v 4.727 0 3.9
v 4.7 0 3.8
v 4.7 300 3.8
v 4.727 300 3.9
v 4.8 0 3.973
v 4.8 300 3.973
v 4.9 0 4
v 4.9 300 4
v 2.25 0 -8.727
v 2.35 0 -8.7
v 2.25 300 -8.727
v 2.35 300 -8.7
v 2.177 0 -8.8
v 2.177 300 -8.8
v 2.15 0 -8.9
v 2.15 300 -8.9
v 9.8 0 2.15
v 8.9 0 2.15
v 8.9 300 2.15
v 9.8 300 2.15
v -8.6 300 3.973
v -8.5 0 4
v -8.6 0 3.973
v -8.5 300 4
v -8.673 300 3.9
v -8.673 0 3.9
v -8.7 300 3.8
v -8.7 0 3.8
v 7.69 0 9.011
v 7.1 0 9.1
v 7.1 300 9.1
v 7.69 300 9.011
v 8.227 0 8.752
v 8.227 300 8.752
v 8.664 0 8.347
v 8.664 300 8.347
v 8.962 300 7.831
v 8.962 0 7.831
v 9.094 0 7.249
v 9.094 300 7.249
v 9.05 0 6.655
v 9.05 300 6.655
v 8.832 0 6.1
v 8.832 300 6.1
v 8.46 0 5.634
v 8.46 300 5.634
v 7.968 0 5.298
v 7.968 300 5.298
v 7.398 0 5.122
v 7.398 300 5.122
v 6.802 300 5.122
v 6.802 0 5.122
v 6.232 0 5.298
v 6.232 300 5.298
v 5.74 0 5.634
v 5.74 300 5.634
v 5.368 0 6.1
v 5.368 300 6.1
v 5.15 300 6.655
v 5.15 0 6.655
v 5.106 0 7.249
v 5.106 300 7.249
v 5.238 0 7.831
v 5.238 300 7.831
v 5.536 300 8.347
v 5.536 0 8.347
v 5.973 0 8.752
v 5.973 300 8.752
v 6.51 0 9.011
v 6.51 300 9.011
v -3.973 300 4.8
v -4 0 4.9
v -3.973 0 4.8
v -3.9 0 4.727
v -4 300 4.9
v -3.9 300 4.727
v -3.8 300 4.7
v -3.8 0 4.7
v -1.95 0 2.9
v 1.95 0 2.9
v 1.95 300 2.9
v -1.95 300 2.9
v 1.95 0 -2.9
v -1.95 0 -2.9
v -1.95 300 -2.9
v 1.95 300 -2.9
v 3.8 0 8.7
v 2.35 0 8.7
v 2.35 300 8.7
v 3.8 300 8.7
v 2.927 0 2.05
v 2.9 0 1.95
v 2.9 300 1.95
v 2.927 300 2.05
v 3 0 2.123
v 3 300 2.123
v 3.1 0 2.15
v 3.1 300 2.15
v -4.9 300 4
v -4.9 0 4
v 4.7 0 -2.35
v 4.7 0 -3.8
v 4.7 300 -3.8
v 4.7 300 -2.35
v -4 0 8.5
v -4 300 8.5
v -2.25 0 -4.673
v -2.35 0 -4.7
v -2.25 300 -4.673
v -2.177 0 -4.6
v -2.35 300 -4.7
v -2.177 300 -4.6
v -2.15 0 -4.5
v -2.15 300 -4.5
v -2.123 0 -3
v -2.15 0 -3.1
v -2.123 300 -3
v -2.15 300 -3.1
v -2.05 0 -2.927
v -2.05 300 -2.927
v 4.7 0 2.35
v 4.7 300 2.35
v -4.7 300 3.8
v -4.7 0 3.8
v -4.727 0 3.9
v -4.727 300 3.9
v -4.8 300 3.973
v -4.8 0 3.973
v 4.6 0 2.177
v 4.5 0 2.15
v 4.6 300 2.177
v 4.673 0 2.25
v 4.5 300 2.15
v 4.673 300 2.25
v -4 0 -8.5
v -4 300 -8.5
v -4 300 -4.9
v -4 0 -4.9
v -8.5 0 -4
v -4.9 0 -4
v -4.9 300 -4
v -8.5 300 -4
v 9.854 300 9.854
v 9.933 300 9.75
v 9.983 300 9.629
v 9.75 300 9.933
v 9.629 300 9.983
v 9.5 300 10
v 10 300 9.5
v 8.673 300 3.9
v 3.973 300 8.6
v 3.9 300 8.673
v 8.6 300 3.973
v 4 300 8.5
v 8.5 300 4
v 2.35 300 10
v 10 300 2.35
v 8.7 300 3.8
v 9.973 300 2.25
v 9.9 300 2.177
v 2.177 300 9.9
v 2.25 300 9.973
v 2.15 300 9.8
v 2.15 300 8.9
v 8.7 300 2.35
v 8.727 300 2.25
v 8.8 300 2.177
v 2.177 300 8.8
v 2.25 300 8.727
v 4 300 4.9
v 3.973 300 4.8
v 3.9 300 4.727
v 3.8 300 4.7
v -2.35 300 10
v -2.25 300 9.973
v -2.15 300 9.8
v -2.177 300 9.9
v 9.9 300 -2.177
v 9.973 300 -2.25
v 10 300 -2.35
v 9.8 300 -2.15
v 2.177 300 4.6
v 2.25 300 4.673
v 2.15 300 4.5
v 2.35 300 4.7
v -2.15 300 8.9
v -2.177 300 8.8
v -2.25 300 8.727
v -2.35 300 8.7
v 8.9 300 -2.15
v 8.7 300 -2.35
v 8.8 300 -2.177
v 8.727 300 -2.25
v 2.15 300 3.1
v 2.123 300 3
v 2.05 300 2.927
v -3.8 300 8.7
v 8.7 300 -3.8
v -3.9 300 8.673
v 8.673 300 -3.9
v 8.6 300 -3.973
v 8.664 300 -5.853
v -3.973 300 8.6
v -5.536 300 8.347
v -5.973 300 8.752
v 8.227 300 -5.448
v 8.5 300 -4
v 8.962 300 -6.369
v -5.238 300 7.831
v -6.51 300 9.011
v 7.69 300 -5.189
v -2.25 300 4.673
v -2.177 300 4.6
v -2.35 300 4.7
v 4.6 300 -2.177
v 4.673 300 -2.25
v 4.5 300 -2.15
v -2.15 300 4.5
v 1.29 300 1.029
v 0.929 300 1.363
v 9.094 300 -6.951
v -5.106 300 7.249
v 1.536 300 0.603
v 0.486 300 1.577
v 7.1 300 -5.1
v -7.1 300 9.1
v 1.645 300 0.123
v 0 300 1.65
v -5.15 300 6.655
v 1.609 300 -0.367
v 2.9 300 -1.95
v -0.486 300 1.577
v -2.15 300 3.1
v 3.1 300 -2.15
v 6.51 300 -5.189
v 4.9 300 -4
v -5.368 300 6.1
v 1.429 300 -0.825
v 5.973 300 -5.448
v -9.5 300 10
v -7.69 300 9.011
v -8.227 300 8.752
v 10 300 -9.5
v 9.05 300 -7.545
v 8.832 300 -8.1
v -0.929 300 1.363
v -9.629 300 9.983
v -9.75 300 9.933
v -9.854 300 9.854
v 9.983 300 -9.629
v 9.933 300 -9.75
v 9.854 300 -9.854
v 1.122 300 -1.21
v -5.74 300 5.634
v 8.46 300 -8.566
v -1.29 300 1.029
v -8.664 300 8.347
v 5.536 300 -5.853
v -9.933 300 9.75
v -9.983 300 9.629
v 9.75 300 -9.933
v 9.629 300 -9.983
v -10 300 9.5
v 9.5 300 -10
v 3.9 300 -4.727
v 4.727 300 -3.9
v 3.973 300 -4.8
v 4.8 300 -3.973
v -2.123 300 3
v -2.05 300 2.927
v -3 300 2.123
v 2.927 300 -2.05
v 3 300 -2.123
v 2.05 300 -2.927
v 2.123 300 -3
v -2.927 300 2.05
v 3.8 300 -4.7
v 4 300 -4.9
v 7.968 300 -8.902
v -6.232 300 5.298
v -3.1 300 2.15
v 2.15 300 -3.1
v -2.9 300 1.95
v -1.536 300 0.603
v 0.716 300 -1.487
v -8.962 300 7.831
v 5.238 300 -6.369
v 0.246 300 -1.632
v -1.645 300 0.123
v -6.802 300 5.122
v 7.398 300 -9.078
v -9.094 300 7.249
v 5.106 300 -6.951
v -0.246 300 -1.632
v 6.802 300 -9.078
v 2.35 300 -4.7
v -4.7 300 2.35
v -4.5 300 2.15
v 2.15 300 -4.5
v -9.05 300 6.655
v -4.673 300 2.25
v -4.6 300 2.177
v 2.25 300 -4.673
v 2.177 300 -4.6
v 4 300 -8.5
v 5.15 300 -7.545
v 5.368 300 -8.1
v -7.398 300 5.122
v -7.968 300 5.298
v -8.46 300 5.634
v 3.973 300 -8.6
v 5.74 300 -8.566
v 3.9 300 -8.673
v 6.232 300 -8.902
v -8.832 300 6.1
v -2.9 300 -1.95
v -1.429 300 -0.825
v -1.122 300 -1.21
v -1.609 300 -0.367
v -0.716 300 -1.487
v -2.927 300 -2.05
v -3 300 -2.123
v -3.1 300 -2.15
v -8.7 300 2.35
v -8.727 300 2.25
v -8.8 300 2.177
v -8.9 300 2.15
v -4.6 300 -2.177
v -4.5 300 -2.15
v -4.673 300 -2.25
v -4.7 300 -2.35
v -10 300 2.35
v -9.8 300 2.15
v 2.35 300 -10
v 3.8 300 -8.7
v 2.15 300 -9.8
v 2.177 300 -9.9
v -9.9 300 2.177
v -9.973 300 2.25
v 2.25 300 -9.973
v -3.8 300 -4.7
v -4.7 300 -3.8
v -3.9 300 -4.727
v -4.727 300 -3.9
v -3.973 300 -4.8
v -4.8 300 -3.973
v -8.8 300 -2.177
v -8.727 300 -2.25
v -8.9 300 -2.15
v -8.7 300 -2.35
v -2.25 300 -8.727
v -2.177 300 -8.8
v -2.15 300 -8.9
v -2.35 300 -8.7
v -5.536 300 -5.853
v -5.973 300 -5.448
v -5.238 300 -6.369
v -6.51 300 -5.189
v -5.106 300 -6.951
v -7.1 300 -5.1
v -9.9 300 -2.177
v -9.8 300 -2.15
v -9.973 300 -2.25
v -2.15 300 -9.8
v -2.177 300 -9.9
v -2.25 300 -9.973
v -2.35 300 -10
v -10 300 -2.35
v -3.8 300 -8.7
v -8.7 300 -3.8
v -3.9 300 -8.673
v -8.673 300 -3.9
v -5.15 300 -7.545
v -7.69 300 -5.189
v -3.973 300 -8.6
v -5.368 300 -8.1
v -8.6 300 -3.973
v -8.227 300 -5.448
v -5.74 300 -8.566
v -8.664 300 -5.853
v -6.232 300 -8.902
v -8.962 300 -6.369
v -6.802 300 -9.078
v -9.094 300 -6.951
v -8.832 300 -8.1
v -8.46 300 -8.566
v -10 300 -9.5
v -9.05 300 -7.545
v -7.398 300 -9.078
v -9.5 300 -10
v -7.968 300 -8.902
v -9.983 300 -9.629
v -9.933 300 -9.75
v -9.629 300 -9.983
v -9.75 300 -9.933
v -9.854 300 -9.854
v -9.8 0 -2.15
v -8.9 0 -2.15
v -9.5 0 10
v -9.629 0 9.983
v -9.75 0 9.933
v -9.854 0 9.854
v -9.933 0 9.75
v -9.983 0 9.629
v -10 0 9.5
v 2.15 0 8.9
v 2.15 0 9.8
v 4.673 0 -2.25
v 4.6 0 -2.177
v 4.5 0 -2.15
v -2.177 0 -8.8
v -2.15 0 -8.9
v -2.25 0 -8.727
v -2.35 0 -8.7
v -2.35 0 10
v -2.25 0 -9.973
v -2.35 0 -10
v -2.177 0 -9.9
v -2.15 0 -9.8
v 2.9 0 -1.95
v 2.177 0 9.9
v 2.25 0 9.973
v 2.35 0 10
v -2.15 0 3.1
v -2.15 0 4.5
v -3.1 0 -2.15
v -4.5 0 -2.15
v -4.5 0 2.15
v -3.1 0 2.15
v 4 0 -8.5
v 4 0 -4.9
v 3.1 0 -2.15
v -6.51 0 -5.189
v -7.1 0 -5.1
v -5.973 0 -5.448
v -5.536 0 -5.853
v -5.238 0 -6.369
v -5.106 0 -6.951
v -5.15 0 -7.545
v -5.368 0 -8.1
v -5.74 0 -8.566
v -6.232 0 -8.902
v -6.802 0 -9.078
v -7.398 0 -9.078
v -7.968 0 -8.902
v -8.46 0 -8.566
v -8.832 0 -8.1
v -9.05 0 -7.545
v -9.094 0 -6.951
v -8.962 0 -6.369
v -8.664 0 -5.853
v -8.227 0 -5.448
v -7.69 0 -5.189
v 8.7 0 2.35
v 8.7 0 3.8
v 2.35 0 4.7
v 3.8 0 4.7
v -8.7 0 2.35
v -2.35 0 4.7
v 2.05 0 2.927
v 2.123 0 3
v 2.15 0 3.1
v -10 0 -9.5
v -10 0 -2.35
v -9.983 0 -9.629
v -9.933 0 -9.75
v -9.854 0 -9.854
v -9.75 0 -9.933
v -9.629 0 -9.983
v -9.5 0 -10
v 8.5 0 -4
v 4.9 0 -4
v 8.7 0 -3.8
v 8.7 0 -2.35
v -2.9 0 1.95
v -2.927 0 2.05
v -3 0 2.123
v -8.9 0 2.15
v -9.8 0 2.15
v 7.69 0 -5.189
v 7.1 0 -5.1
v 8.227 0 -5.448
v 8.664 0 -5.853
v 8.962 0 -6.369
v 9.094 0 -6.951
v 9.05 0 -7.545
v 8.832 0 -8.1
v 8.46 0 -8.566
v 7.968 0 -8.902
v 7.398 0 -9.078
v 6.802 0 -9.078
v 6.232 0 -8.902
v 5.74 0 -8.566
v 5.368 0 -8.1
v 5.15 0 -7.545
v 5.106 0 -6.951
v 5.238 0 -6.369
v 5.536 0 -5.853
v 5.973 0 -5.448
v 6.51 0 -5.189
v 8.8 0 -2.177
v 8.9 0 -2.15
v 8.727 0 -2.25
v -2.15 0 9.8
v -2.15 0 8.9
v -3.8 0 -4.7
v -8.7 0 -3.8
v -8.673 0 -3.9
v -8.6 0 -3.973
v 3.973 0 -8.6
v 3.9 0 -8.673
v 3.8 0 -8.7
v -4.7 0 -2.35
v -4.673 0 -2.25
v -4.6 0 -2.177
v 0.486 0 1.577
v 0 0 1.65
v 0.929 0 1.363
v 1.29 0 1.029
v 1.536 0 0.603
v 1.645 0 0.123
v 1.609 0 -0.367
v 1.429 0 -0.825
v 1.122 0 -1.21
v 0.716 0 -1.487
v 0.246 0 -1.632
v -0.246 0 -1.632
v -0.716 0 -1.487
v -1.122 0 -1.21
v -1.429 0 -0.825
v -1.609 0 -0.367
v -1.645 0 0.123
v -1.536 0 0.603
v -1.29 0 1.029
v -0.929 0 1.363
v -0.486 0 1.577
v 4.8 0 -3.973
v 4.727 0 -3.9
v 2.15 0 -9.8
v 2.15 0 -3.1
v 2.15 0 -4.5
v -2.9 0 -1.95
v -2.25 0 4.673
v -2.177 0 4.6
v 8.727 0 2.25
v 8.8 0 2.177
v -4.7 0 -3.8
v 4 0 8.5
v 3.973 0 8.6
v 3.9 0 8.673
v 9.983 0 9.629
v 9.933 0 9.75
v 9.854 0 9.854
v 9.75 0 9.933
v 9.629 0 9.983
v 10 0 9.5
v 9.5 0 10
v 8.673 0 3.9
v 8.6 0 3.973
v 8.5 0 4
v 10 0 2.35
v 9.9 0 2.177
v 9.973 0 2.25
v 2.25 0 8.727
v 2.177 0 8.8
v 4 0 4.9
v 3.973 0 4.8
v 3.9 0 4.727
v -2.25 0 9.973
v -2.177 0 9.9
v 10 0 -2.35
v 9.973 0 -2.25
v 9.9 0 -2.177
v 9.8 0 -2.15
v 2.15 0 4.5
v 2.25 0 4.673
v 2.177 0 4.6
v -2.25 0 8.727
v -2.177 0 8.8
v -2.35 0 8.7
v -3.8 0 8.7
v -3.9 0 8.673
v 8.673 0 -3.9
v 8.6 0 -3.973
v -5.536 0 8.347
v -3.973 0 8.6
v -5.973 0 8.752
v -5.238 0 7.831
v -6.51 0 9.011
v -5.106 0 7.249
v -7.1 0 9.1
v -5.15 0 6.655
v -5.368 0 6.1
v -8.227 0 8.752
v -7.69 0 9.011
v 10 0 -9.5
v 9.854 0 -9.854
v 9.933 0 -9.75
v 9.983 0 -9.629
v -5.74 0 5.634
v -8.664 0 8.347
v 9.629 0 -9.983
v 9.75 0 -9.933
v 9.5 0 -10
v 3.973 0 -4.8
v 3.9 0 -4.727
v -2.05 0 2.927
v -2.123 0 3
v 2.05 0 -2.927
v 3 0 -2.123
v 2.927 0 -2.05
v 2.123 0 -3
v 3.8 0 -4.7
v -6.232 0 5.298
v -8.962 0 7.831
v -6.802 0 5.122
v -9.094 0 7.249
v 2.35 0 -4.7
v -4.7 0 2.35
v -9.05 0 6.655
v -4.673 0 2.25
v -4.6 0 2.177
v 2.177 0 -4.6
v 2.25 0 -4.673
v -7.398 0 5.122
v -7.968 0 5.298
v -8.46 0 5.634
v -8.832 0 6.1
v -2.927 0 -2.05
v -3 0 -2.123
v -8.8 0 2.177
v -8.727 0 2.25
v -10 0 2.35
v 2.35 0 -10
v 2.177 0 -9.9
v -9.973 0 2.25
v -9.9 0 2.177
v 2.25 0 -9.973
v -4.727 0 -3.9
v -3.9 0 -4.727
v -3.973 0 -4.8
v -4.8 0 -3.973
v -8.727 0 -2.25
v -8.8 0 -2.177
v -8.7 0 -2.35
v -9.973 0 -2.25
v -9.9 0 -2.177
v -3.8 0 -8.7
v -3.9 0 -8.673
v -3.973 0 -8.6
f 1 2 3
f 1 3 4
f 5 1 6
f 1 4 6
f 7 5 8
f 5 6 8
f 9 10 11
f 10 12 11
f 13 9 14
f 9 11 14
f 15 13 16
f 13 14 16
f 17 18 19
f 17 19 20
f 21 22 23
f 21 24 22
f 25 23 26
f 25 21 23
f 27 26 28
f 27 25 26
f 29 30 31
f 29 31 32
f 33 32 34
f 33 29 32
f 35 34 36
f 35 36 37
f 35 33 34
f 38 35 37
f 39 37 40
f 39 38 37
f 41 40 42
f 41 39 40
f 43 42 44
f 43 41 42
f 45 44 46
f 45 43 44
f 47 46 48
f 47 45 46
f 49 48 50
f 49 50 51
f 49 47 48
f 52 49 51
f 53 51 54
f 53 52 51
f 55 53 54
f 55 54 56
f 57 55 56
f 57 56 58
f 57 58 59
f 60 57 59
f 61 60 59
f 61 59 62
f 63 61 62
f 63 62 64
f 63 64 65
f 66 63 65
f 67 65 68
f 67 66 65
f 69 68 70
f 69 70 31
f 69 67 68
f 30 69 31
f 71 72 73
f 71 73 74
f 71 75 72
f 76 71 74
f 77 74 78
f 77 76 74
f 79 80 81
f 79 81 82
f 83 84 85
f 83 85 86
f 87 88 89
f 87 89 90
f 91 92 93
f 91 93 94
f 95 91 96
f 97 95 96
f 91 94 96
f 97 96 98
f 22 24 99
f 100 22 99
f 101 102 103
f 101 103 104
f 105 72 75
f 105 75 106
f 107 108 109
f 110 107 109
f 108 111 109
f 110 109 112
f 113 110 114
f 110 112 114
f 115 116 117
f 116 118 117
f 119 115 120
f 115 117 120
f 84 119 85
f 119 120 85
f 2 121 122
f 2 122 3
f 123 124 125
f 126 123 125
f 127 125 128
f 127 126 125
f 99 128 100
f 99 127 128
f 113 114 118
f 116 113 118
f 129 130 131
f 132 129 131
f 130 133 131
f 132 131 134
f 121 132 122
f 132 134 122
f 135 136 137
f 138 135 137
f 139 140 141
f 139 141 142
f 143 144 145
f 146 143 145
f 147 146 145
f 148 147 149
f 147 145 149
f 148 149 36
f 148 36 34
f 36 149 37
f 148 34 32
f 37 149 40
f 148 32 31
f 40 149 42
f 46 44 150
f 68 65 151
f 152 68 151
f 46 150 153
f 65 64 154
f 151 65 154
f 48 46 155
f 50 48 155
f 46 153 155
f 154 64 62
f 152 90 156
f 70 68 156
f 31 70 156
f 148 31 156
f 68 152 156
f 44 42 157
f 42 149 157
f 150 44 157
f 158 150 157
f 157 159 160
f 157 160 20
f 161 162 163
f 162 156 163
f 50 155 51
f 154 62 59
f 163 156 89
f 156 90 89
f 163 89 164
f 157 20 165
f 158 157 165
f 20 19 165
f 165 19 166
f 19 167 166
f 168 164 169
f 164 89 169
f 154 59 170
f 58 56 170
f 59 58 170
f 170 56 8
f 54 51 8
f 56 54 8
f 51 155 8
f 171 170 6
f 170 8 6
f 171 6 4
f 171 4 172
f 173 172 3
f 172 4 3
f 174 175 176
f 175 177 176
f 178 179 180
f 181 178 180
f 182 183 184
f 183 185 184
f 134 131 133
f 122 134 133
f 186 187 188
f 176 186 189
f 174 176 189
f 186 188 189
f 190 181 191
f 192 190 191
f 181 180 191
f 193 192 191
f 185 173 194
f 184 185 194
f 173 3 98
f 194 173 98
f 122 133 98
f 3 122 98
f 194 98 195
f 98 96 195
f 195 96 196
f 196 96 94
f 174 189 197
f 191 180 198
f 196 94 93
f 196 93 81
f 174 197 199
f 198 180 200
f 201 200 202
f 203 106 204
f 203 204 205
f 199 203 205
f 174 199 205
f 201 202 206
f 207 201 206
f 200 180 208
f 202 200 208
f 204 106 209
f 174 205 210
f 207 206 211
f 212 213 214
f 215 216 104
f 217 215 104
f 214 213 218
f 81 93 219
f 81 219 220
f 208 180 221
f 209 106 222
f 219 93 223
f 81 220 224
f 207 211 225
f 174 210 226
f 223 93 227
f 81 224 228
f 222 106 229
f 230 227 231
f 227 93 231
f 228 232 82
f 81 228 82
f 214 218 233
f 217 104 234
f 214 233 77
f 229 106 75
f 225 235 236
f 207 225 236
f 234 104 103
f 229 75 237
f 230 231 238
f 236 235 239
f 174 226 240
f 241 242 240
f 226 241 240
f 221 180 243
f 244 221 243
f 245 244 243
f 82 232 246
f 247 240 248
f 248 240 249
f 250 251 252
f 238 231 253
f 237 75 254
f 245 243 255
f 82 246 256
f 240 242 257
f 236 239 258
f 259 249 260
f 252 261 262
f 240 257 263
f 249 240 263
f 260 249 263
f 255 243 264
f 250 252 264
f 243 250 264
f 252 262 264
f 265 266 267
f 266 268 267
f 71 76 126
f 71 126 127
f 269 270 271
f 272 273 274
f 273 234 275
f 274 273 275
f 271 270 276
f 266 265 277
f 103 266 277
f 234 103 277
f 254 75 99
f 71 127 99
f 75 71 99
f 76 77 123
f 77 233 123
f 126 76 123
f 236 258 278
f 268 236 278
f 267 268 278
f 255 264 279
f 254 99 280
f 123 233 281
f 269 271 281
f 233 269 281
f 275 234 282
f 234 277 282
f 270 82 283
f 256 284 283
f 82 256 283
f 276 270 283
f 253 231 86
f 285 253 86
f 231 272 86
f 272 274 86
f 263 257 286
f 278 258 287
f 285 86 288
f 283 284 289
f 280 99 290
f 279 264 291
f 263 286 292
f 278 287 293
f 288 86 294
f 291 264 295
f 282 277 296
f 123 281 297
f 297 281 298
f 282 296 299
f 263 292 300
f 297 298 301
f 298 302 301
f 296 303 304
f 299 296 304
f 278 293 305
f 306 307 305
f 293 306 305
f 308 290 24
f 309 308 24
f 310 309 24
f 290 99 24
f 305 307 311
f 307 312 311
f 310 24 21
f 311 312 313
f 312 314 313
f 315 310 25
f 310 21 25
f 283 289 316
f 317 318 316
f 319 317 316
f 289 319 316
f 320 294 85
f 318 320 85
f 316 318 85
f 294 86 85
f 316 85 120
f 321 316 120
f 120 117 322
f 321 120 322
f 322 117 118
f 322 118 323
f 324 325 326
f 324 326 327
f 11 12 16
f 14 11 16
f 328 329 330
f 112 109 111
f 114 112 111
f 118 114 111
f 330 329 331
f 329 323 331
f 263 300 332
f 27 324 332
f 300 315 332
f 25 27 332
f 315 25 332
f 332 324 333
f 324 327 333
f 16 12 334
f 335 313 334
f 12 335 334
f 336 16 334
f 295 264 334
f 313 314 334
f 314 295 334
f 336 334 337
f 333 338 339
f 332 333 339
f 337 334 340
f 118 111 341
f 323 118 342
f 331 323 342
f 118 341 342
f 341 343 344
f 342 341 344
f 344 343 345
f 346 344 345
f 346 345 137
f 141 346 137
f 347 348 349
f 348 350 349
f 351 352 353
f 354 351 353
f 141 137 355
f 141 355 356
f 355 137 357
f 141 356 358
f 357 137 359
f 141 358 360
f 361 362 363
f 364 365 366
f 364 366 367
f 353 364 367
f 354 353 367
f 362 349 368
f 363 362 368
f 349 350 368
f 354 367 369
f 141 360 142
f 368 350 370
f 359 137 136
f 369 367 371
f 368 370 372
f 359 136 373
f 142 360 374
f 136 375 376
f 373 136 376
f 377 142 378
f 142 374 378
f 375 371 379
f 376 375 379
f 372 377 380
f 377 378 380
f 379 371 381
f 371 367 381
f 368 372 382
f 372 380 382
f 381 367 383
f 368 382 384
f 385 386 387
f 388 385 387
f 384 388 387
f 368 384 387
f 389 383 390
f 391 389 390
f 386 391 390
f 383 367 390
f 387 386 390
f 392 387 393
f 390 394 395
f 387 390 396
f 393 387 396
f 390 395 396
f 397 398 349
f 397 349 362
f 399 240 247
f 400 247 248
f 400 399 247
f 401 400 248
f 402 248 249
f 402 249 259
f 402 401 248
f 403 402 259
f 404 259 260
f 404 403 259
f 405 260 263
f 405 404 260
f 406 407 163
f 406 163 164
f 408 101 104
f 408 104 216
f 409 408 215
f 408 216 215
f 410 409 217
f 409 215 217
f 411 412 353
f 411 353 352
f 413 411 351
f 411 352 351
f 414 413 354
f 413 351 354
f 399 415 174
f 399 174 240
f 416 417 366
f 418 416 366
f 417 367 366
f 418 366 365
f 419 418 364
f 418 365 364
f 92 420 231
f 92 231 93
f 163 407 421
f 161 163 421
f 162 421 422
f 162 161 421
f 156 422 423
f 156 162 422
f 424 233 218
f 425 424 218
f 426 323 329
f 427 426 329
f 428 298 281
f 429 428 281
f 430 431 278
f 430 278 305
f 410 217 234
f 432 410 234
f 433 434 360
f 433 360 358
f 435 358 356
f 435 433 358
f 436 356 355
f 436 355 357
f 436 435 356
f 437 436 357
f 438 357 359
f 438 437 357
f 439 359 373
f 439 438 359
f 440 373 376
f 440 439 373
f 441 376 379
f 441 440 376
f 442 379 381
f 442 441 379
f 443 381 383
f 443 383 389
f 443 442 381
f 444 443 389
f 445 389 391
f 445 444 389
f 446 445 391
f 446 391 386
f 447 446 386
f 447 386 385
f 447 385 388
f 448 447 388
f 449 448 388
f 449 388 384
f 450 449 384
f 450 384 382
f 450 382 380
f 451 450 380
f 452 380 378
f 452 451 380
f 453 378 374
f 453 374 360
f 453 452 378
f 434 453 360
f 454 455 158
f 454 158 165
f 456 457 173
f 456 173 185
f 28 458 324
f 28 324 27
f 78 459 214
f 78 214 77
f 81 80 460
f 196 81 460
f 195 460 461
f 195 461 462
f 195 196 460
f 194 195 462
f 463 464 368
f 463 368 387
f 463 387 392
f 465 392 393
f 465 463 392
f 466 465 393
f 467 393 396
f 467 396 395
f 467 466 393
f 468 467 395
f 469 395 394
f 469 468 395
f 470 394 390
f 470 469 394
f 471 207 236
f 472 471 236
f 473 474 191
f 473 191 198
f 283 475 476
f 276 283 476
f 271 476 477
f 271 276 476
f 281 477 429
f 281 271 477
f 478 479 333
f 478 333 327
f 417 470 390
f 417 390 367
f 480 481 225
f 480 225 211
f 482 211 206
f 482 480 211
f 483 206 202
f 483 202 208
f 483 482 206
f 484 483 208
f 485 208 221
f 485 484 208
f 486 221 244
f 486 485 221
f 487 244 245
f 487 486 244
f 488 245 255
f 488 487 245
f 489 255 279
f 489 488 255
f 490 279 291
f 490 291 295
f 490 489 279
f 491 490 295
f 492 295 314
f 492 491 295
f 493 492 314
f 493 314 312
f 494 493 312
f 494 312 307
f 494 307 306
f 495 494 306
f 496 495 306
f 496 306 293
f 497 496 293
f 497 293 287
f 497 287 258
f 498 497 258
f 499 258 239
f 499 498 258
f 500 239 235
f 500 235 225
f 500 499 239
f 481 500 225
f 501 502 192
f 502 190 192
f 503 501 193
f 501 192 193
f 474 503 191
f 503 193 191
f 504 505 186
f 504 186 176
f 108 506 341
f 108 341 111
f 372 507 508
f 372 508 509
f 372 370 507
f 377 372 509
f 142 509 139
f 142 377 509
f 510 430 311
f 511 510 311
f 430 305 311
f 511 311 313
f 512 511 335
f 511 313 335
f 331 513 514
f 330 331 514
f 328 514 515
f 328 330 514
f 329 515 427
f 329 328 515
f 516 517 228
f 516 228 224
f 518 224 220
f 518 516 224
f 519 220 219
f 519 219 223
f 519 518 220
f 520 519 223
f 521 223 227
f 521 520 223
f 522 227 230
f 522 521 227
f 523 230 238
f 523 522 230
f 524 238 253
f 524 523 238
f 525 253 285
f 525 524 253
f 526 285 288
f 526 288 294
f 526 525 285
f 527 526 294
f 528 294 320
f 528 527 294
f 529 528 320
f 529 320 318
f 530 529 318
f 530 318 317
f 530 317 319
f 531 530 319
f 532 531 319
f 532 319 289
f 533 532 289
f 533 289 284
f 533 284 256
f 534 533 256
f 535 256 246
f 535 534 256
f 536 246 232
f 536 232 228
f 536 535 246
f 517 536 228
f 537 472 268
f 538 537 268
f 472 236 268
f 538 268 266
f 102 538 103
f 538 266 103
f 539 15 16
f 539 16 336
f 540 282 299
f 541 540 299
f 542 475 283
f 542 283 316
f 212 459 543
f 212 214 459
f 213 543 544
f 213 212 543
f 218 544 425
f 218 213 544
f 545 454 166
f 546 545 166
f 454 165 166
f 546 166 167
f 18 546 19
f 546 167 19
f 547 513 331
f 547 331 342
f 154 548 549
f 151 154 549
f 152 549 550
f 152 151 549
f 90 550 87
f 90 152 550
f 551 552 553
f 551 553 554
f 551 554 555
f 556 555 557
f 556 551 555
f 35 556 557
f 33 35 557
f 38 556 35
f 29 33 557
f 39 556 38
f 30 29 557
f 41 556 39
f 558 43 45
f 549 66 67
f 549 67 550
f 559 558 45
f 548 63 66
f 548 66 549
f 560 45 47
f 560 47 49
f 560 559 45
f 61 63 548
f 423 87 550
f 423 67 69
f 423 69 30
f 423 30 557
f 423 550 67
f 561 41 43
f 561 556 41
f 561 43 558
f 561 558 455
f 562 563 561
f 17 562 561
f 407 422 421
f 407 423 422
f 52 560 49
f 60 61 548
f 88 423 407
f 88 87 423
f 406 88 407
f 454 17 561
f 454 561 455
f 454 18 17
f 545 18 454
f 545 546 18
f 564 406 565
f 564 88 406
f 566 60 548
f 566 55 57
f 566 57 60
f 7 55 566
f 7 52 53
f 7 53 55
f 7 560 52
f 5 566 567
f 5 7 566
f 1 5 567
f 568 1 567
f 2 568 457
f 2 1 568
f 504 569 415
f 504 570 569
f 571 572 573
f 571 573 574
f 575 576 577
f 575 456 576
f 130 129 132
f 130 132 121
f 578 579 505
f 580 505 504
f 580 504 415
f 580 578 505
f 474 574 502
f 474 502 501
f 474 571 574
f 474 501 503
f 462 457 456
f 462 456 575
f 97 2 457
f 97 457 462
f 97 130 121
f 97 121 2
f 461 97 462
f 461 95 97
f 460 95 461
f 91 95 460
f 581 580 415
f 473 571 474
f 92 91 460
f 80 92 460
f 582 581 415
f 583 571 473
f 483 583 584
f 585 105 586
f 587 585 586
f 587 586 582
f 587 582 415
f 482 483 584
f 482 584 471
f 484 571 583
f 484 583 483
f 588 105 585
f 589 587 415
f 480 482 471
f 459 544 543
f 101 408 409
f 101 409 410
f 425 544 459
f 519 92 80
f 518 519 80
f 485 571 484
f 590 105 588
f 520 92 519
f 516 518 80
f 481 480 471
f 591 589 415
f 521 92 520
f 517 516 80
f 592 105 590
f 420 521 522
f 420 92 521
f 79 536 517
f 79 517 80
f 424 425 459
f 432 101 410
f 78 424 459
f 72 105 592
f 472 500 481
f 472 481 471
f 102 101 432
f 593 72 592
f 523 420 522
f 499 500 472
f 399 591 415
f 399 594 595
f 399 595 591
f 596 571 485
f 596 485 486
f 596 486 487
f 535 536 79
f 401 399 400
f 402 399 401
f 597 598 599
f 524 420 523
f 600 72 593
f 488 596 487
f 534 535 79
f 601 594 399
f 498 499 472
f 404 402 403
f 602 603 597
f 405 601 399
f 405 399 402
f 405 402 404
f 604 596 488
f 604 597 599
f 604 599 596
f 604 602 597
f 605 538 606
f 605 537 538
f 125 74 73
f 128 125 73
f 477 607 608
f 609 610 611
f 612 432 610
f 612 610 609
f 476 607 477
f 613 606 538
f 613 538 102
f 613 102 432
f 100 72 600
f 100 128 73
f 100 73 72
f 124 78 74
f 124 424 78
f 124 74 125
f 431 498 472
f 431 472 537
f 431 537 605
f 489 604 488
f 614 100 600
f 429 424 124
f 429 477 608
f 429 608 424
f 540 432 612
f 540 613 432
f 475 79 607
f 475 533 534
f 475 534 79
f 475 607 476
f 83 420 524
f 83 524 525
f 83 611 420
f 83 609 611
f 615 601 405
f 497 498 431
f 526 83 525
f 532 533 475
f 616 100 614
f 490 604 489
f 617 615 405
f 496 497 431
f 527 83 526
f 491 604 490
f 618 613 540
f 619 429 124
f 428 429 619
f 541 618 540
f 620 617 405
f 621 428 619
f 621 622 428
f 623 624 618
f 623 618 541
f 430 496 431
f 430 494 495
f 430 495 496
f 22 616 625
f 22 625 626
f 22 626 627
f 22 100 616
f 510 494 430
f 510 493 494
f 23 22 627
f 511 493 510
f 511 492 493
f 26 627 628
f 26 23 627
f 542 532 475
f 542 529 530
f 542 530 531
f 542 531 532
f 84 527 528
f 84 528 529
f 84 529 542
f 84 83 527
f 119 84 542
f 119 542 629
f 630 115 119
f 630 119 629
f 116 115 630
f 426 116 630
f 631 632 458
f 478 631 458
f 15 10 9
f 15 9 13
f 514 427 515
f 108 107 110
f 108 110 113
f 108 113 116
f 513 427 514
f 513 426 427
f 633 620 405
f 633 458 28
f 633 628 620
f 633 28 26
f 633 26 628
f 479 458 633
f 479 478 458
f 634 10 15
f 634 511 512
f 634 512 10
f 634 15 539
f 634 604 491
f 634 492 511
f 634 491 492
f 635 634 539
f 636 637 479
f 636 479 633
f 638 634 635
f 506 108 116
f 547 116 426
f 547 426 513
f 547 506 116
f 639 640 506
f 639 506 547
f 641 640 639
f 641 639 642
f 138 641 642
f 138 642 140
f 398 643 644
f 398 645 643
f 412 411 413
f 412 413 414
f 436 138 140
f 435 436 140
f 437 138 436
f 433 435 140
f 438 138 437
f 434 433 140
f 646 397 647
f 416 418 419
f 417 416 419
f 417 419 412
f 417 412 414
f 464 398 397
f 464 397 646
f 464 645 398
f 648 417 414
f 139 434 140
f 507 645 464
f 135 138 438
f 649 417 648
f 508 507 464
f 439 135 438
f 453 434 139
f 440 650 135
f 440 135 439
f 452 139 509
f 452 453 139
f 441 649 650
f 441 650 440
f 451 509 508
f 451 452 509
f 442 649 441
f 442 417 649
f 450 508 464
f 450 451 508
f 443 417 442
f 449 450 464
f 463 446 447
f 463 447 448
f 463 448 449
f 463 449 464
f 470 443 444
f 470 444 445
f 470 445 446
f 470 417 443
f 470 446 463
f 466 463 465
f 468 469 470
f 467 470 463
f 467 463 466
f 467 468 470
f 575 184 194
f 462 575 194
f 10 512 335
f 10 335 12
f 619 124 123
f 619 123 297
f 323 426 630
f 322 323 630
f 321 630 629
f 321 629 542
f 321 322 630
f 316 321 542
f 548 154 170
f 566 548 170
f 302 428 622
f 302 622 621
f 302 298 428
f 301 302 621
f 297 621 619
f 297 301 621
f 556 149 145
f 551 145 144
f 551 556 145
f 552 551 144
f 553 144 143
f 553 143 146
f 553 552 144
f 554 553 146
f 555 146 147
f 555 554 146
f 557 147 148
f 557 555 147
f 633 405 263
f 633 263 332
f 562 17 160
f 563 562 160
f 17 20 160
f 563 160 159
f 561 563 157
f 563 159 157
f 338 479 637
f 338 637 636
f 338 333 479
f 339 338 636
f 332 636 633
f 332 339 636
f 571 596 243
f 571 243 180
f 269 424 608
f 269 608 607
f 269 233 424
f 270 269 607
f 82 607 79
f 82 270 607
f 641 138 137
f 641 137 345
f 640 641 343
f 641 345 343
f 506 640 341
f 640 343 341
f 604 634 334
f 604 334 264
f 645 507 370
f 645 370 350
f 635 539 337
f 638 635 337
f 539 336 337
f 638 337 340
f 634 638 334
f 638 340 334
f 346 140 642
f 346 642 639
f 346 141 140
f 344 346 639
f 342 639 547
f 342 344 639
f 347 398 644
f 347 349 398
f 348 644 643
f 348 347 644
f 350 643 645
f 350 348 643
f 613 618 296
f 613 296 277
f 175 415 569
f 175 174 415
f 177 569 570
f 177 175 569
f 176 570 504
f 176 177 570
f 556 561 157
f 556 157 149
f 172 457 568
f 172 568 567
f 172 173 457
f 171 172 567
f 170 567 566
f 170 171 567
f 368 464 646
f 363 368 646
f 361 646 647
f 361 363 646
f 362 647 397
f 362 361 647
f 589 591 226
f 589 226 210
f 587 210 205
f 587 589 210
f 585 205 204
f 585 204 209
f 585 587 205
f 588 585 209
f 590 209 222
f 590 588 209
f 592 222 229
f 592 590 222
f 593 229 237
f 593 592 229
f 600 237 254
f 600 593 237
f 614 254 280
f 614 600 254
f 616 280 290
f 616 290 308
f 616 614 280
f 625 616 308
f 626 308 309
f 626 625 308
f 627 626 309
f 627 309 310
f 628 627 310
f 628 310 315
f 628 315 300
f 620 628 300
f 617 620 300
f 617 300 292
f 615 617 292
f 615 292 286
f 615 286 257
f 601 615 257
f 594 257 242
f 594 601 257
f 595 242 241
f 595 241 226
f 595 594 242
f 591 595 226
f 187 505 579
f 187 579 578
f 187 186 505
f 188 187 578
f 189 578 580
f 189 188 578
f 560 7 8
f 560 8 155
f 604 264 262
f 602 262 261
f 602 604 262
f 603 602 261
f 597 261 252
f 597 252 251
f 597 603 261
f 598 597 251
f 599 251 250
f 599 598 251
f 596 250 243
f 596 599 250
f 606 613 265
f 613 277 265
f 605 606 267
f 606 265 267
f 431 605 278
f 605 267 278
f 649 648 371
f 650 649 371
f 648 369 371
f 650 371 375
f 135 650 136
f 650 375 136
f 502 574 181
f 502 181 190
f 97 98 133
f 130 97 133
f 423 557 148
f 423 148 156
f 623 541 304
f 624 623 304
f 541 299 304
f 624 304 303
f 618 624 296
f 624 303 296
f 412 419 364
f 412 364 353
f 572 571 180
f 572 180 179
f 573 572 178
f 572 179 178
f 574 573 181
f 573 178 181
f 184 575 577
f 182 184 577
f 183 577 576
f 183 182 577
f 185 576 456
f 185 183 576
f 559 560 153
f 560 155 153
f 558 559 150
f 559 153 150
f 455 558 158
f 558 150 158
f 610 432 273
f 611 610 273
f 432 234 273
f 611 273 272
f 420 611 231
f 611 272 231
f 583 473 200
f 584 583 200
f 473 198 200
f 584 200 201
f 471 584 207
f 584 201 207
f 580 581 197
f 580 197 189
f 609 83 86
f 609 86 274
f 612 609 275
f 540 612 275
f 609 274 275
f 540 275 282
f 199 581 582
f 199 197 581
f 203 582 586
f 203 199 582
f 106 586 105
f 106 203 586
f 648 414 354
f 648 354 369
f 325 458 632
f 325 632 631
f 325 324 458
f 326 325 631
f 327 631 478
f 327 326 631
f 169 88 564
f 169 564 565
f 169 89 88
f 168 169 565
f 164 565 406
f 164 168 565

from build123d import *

# Parameters (mm, degrees)
SKETCH_1_R      = 2
SKETCH_1_R_2    = 1.65
EXTRUDE_1_DEPTH = 300
FILLET_1_R      = 0.2


with BuildPart() as part:
    # 草图1 → 凸台-拉伸1 (new body)
    with BuildSketch(Plane(origin=(0, 0, 0), x_dir=(1, 0, 0), z_dir=(0, 1, 0))):
        with BuildLine():
            Line((-9.5, 10), (-2.15, 10))
            Line((-2.15, 10), (-2.15, 8.7))
            Line((-2.15, 8.7), (-4, 8.7))
            Line((-4, 8.7), (-4, 4.7))
            Line((-4, 4.7), (-2.15, 4.7))
            Line((-2.15, 4.7), (-2.15, 2.9))
            Line((-2.15, 2.9), (0, 2.9))
            Line((0, 2.9), (2.15, 2.9))
            Line((2.15, 2.9), (2.15, 4.7))
            Line((2.15, 4.7), (4, 4.7))
            Line((4, 4.7), (4, 8.7))
            Line((4, 8.7), (2.15, 8.7))
            Line((2.15, 8.7), (2.15, 10))
            Line((2.15, 10), (9.5, 10))
            ThreePointArc((9.5, 10), (9.853553391, 9.853553391), (10, 9.5))
            Line((10, 9.5), (10, 2.15))
            Line((10, 2.15), (8.7, 2.15))
            Line((8.7, 2.15), (8.7, 4))
            Line((8.7, 4), (4.7, 4))
            Line((4.7, 4), (4.7, 2.15))
            Line((4.7, 2.15), (2.9, 2.15))
            Line((2.9, 2.15), (2.9, 0))
            Line((2.9, 0), (2.9, -2.15))
            Line((2.9, -2.15), (4.7, -2.15))
            Line((4.7, -2.15), (4.7, -4))
            Line((4.7, -4), (8.7, -4))
            Line((8.7, -4), (8.7, -2.15))
            Line((8.7, -2.15), (10, -2.15))
            Line((10, -2.15), (10, -9.5))
            ThreePointArc((10, -9.5), (9.853553391, -9.853553391), (9.5, -10))
            Line((9.5, -10), (2.15, -10))
            Line((2.15, -10), (2.15, -8.7))
            Line((2.15, -8.7), (4, -8.7))
            Line((4, -8.7), (4, -4.7))
            Line((4, -4.7), (2.15, -4.7))
            Line((2.15, -4.7), (2.15, -2.9))
            Line((2.15, -2.9), (0, -2.9))
            Line((0, -2.9), (-2.15, -2.9))
            Line((-2.15, -2.9), (-2.15, -4.7))
            Line((-2.15, -4.7), (-4, -4.7))
            Line((-4, -4.7), (-4, -8.7))
            Line((-4, -8.7), (-2.15, -8.7))
            Line((-2.15, -8.7), (-2.15, -10))
            Line((-2.15, -10), (-9.5, -10))
            ThreePointArc((-9.5, -10), (-9.853553391, -9.853553391), (-10, -9.5))
            Line((-10, -9.5), (-10, -2.15))
            Line((-10, -2.15), (-8.7, -2.15))
            Line((-8.7, -2.15), (-8.7, -4))
            Line((-8.7, -4), (-4.7, -4))
            Line((-4.7, -4), (-4.7, -2.15))
            Line((-4.7, -2.15), (-2.9, -2.15))
            Line((-2.9, -2.15), (-2.9, 0))
            Line((-2.9, 0), (-2.9, 2.15))
            Line((-2.9, 2.15), (-4.7, 2.15))
            Line((-4.7, 2.15), (-4.7, 4))
            Line((-4.7, 4), (-8.7, 4))
            Line((-8.7, 4), (-8.7, 2.15))
            Line((-8.7, 2.15), (-10, 2.15))
            Line((-10, 2.15), (-10, 9.5))
            ThreePointArc((-10, 9.5), (-9.853553391, 9.853553391), (-9.5, 10))
        make_face()
        with Locations(Location((-7.1, 7.1, 0), (0, 0, 270))):
            Circle(SKETCH_1_R, mode=Mode.SUBTRACT)
        with Locations(Location((7.1, 7.1, 0), (0, 0, 270))):
            Circle(SKETCH_1_R, mode=Mode.SUBTRACT)
        with Locations(Location((7.1, -7.1, 0), (0, 0, 270))):
            Circle(SKETCH_1_R, mode=Mode.SUBTRACT)
        with Locations(Location((-7.1, -7.1, 0), (0, 0, 270))):
            Circle(SKETCH_1_R, mode=Mode.SUBTRACT)
        with Locations(Location((0, 0, 0), (0, 0, 270))):
            Circle(SKETCH_1_R_2, mode=Mode.SUBTRACT)
    extrude(amount=EXTRUDE_1_DEPTH)

    # 圆角1
    fillet_1_edges = [part.edges().sort_by_distance(p)[0] for p in [
        (8.7, 150, 2.15),
        (10, 150, 2.15),
        (2.15, 150, 10),
        (2.15, 150, 8.7),
        (4, 150, 8.7),
        (4, 150, 4.7),
        (2.15, 150, 4.7),
        (2.15, 150, 2.9),
        (-2.15, 150, 2.9),
        (-2.15, 150, 4.7),
        (-4, 150, 4.7),
        (-4, 150, 8.7),
        (-2.15, 150, 8.7),
        (-2.15, 150, 10),
        (-10, 150, 2.15),
        (-8.7, 150, 2.15),
        (-8.7, 150, 4),
        (-4.7, 150, 4),
        (-4.7, 150, 2.15),
        (-2.9, 150, 2.15),
        (-2.9, 150, -2.15),
        (-4.7, 150, -2.15),
        (-4.7, 150, -4),
        (-8.7, 150, -4),
        (-8.7, 150, -2.15),
        (-10, 150, -2.15),
        (-2.15, 150, -10),
        (-2.15, 150, -8.7),
        (-4, 150, -8.7),
        (-4, 150, -4.7),
        (-2.15, 150, -4.7),
        (-2.15, 150, -2.9),
        (2.15, 150, -2.9),
        (2.15, 150, -4.7),
        (4, 150, -4.7),
        (4, 150, -8.7),
        (2.15, 150, -8.7),
        (2.15, 150, -10),
        (10, 150, -2.15),
        (8.7, 150, -2.15),
        (8.7, 150, -4),
        (4.7, 150, -4),
        (4.7, 150, -2.15),
        (2.9, 150, -2.15),
        (2.9, 150, 2.15),
        (4.7, 150, 2.15),
        (4.7, 150, 4),
        (8.7, 150, 4),
    ]]
    fillet(fillet_1_edges, radius=FILLET_1_R)


solid = part.part
